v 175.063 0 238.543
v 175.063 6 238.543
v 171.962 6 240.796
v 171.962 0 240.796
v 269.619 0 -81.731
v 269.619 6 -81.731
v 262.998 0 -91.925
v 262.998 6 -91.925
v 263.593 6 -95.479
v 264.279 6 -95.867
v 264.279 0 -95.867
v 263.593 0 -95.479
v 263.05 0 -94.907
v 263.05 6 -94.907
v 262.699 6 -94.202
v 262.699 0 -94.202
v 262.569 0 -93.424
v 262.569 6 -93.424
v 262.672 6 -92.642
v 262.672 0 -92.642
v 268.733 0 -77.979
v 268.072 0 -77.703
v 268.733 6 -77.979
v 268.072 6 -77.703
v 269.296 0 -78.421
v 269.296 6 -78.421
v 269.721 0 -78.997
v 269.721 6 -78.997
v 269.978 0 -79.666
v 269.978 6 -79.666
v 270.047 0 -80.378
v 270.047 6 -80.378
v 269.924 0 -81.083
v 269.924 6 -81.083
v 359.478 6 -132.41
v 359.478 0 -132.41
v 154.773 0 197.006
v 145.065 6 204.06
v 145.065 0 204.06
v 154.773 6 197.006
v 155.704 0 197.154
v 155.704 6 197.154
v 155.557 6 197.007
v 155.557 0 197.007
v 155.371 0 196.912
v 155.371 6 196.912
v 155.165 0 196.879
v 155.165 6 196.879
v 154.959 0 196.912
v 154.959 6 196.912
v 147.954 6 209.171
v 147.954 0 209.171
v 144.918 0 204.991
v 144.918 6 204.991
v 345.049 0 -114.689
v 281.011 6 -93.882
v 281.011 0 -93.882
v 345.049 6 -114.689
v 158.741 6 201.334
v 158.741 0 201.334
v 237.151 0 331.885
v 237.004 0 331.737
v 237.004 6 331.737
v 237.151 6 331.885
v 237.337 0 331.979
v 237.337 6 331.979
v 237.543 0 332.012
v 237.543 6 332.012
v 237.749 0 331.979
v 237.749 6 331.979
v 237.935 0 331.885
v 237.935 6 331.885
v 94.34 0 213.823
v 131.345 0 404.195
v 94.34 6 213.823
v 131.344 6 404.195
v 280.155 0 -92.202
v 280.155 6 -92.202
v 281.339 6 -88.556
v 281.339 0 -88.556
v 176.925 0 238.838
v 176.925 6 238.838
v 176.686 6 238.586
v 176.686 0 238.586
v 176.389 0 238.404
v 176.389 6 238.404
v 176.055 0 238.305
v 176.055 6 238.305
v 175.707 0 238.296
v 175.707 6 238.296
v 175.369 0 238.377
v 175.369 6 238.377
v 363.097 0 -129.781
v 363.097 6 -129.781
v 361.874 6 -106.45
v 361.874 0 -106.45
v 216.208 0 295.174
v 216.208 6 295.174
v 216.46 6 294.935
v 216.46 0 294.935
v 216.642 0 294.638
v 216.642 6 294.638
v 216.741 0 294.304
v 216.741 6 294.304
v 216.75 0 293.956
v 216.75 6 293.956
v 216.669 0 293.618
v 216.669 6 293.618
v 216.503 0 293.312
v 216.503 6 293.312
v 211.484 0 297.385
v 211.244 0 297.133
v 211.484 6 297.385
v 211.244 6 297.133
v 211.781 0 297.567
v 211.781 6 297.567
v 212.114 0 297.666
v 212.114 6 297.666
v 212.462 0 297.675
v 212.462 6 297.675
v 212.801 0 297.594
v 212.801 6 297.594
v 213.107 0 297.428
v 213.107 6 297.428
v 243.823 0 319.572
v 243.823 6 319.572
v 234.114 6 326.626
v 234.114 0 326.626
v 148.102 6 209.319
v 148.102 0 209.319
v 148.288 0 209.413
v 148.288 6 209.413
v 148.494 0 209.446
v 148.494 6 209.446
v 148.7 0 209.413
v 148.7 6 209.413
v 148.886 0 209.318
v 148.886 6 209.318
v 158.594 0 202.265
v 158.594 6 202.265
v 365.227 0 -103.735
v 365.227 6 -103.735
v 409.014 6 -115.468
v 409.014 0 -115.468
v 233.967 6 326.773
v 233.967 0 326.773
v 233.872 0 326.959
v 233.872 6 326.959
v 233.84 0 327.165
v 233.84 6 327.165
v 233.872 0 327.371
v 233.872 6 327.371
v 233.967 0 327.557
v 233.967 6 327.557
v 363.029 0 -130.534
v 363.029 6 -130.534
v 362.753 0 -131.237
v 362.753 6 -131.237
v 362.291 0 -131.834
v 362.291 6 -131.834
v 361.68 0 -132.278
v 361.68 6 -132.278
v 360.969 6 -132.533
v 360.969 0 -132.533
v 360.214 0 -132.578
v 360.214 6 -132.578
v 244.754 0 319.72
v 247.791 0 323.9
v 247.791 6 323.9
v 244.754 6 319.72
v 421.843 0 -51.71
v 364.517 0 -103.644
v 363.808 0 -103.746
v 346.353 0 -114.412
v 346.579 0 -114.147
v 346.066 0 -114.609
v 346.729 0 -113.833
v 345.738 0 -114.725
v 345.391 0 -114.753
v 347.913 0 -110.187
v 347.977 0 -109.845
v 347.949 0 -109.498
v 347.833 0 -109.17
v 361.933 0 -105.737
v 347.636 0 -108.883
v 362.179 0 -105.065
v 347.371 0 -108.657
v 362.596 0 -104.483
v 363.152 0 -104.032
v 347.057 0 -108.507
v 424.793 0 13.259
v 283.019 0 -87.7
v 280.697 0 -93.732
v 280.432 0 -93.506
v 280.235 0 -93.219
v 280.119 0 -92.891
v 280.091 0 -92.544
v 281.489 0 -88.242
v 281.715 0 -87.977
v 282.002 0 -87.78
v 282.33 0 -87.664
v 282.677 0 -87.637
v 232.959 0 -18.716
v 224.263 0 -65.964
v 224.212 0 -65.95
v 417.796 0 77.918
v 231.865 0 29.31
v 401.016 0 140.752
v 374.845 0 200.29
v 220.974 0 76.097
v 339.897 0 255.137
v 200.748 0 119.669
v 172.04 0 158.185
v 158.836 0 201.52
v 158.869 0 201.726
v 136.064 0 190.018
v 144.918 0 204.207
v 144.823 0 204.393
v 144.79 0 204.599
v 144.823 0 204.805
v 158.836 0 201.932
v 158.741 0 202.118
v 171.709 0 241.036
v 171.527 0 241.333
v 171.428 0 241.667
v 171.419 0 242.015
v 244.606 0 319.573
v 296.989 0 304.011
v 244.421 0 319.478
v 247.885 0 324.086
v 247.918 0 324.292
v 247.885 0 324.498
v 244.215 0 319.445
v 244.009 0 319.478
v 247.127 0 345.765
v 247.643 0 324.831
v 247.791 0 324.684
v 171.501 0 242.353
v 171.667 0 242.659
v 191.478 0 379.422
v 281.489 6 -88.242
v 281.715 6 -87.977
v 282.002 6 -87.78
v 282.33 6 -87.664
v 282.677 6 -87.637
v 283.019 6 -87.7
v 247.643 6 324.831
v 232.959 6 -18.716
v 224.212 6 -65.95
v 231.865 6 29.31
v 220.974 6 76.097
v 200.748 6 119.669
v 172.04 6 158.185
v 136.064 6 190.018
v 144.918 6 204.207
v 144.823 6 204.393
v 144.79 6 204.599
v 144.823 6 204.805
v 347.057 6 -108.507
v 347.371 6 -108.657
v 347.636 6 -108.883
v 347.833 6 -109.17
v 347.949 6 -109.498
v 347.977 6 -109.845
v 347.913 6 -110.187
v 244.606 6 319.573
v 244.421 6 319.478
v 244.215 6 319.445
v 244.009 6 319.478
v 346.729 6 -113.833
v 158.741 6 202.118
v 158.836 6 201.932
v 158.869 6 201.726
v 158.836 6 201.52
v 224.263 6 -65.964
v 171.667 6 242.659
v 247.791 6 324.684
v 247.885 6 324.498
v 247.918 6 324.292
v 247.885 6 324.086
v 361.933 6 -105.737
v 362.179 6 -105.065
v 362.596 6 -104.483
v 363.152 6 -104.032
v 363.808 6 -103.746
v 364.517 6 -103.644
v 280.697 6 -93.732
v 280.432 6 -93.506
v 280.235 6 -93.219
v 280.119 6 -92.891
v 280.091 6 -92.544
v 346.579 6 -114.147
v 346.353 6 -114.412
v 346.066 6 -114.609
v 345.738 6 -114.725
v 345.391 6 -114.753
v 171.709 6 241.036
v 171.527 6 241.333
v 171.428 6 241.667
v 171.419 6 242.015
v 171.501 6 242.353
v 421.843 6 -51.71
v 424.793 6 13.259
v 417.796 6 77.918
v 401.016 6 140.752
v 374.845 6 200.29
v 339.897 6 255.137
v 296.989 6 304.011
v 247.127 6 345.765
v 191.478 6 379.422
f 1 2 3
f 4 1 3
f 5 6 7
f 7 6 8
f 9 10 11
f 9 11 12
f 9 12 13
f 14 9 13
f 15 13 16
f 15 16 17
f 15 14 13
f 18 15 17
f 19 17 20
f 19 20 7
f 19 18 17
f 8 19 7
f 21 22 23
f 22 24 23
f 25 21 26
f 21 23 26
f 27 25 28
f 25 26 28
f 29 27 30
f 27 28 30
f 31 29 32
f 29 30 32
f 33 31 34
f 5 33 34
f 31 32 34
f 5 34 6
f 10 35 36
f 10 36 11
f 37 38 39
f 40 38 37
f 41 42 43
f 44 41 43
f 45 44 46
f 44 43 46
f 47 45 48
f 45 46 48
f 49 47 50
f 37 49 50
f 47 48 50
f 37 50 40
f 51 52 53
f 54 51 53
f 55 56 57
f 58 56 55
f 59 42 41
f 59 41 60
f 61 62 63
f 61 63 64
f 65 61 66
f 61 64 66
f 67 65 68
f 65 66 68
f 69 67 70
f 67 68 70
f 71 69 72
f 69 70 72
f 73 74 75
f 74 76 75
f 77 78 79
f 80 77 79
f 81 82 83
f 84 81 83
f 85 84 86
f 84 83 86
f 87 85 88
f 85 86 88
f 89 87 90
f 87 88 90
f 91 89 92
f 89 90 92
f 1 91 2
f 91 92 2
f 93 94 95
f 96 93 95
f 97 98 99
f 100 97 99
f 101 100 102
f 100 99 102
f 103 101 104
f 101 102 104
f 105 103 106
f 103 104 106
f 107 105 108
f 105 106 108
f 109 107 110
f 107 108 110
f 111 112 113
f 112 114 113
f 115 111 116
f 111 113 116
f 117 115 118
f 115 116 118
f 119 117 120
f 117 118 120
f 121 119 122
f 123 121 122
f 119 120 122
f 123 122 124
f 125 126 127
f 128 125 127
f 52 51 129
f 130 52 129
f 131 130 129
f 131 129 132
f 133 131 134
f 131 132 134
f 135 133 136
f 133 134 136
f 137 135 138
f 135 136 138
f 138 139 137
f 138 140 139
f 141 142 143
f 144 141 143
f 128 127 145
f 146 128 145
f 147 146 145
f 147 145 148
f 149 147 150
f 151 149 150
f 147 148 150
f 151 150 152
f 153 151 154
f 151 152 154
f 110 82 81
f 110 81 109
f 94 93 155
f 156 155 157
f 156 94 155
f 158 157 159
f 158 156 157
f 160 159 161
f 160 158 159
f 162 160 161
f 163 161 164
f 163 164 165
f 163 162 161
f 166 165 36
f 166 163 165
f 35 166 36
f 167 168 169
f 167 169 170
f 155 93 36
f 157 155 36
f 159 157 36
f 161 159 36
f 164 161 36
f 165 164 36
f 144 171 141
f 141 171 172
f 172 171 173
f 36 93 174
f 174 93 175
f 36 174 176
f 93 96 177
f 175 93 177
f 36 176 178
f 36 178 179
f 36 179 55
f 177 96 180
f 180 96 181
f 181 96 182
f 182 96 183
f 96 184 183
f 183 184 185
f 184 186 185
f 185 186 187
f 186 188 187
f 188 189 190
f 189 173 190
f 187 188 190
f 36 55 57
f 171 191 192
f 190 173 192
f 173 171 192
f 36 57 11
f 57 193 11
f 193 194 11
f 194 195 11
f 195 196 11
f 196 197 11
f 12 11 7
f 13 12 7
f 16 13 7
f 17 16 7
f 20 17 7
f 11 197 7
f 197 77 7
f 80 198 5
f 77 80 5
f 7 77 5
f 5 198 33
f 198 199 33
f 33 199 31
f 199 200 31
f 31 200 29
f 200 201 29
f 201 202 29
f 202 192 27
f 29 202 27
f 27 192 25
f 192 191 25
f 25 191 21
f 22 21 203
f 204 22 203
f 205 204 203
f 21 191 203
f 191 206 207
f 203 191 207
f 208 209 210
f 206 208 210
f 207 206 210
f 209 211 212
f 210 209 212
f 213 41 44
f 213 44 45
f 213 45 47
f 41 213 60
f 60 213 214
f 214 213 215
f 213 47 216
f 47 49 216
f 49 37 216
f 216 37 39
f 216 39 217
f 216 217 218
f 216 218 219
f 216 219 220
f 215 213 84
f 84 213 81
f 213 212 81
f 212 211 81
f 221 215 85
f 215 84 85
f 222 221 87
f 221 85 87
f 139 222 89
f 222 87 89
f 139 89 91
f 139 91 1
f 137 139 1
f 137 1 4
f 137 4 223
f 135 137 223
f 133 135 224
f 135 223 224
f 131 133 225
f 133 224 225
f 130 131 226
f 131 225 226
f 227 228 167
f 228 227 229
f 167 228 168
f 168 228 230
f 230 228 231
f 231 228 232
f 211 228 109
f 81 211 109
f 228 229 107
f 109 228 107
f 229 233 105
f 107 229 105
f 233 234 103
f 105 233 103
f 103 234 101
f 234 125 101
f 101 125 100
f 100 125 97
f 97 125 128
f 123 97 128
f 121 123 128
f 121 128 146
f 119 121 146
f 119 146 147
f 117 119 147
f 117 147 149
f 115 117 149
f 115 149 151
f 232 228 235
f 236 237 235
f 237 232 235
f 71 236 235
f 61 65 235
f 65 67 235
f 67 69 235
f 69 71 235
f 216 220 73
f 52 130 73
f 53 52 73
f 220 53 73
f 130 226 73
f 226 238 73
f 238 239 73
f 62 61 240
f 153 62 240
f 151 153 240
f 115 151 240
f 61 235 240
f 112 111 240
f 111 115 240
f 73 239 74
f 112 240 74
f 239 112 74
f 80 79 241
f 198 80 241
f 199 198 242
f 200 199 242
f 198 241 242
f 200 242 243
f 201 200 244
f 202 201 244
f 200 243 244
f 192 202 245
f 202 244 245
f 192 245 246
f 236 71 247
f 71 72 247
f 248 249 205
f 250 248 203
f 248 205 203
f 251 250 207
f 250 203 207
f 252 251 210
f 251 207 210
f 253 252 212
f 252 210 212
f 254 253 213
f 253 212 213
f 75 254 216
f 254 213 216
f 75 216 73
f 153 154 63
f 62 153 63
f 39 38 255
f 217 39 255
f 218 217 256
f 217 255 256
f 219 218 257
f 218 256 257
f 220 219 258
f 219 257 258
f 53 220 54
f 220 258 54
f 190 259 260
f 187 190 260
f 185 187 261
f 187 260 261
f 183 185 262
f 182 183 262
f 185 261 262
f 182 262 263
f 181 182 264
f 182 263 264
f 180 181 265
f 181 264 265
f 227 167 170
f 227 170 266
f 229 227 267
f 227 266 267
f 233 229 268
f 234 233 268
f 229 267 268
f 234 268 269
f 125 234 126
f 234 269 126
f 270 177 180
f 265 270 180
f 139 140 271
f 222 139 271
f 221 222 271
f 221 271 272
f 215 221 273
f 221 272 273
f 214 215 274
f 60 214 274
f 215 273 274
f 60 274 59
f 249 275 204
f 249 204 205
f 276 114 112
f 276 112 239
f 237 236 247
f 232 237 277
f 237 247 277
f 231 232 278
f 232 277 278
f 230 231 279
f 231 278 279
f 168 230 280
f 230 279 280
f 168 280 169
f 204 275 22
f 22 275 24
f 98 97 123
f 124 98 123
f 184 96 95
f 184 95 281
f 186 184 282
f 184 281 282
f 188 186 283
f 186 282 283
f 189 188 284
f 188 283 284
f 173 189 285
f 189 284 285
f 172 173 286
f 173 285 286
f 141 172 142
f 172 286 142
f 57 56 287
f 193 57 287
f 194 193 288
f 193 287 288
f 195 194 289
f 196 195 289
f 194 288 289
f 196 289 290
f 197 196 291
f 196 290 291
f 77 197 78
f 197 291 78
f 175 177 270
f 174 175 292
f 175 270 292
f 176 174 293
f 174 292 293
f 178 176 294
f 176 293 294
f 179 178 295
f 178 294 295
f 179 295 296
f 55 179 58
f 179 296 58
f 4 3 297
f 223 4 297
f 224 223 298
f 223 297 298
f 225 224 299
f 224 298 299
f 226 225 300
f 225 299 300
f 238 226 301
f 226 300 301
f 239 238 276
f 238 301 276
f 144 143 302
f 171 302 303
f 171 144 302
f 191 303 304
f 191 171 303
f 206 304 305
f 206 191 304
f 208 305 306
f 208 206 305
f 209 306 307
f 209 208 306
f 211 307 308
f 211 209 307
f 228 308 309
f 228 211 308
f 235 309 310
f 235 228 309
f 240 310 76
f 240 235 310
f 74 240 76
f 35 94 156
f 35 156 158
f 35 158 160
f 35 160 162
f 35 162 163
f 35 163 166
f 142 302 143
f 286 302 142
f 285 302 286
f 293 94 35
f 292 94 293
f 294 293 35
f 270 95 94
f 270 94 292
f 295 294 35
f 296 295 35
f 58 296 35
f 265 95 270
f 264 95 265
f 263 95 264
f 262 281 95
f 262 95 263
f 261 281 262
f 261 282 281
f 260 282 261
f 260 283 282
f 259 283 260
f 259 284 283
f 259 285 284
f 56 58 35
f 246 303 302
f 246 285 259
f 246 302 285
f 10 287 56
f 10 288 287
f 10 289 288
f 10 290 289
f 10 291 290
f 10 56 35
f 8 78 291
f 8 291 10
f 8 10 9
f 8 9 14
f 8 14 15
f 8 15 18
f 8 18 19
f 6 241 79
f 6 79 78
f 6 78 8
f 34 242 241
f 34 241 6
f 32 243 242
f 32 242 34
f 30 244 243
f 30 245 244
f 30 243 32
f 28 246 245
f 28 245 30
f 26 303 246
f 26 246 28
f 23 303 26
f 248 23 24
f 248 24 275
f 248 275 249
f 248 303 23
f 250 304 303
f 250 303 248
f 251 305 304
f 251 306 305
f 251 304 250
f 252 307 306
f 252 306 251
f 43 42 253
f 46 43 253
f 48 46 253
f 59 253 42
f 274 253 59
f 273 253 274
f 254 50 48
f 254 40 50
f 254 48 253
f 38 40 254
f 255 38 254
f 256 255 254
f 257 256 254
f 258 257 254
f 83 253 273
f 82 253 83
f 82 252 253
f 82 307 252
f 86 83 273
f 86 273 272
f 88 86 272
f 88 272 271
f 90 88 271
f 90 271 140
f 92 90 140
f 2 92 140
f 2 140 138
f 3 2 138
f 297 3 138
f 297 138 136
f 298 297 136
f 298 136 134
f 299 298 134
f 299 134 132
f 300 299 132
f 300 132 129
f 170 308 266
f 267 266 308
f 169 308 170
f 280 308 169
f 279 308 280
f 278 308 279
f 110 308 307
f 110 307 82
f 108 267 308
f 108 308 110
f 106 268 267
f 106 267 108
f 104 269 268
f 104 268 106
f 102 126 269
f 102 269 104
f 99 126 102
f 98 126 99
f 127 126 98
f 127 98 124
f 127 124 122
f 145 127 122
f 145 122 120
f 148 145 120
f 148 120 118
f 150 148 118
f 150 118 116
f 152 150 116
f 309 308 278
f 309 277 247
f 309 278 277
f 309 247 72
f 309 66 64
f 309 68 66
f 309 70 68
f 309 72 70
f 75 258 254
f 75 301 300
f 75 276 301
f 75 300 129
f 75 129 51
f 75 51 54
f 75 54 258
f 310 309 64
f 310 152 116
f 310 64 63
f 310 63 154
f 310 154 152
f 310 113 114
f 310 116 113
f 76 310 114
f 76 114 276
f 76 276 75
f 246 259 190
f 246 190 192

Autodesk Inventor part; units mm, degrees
ref_plane "YZ Plane" through (0, 0, 0) normal (1, 0, 0) x (0, 1, 0)
ref_plane "XZ Plane" through (0, 0, 0) normal (0, 1, 0) x (-1, 0, 0)
ref_plane "XY Plane" through (0, 0, 0) normal (0, 0, 1) x (1, 0, 0)
sketch "Sketch1" plane through (0, 0, 0) normal (0, 1, 0) x (-1, 0, 0)
  circle A0 centre (0, 0) radius 425
  circle A1 centre (0, 0) radius 233.71
  dimension "d84" = 467.42
  dimension "d85" = 850
extrude "Extrusion3" add sketch "Sketch1" along normal blind 6
sketch "Sketch2" plane through (0, 6, 0) normal (0, 1, 0) x (1, 0, 0)
  circle A0 centre (0, 0) radius 329.355 construction
  line L0 (3.25, 363.0217) -> (3.25, 295.6883)
  line L1 (-3.25, 295.6883) -> (-3.25, 363.0217)
  arc A1 (-3.25, 295.6883) -> (-1.9167, 294.355) centre (-1.9167, 295.6883) ccw
  arc A2 (1.9167, 294.355) -> (3.25, 295.6883) centre (1.9167, 295.6883) ccw
  arc A3 (-1.9167, 364.355) -> (-3.25, 363.0217) centre (-1.9167, 363.0217) ccw
  arc A4 (3.25, 363.0217) -> (1.9167, 364.355) centre (1.9167, 363.0217) ccw
  line L2 (-1.9167, 364.355) -> (1.9167, 364.355)
  line L3 (-1.9167, 294.355) -> (1.9167, 294.355)
  line L4 (0, 294.355) -> (0, 329.355) construction
  line L5 (0, 364.355) -> (0, 329.355) construction
  line L6 (0, 364.355) -> (0, 294.355) construction
  line L7 (175.0629, -238.5433) -> (171.9617, -240.7965)
  arc A5 (176.9253, -238.8383) -> (175.0629, -238.5433) centre (175.8467, -239.622) ccw
  arc A6 (171.9617, -240.7965) -> (171.6667, -242.6589) centre (172.7454, -241.8752) ccw
  line L8 (173.0175, -238.1382) -> (193.59, -266.4538) construction
  line L9 (211.2443, -297.1327) -> (171.6667, -242.6589)
  line L10 (176.9253, -238.8383) -> (216.5029, -293.3121)
  line L11 (214.1625, -294.7694) -> (173.0175, -238.1382) construction
  line L12 (214.1625, -294.7694) -> (193.59, -266.4538) construction
  arc A7 (211.2443, -297.1327) -> (213.1067, -297.4277) centre (212.323, -296.349) ccw
  line L13 (216.2079, -295.1745) -> (213.1067, -297.4277)
  arc A8 (216.2079, -295.1745) -> (216.5029, -293.3121) centre (215.4242, -294.0958) ccw
  line L14 (280.1548, 92.2019) -> (281.3393, 88.5562)
  arc A9 (281.0108, 93.882) -> (280.1548, 92.2019) centre (281.4229, 92.614) ccw
  arc A10 (281.3393, 88.5562) -> (283.0194, 87.7002) centre (282.6074, 88.9682) ccw
  line L15 (279.9482, 90.9607) -> (313.2352, 101.7763) construction
  line L16 (347.0573, 108.5073) -> (283.0194, 87.7002)
  line L17 (281.0108, 93.882) -> (345.0486, 114.6892)
  line L18 (346.5222, 112.5919) -> (279.9482, 90.9607) construction
  line L19 (346.5222, 112.5919) -> (313.2352, 101.7763) construction
  arc A11 (347.0573, 108.5073) -> (347.9133, 110.1874) centre (346.6452, 109.7754) ccw
  line L20 (346.7287, 113.8331) -> (347.9133, 110.1874)
  arc A12 (346.7287, 113.8331) -> (345.0486, 114.6892) centre (345.4607, 113.4211) ccw
  dimension "d86" = 658.71
  dimension "d21" = 6.5
  dimension "d24" = 2.6667
  dimension "d25" = 2.6667
  dimension "d32" = 1.3333
  dimension "d33" = 1.3333
  dimension "d162" = 70
  dimension "d163" = 294.355
  dimension "d165" = 3.25
extrude "Extrusion4" cut sketch "Sketch2" against normal through all
sketch "Sketch3" plane through (0, 6, 0) normal (0, 1, 0) x (1, 0, 0)
  arc A0 (-131.3389, -404.1968) -> (131.3445, -404.195) centre (0, 0) ccw
  arc A1 (-77.7244, -128.3741) -> (77.7297, -128.3709) centre (0, 0) ccw
  line L0 (-122.1811, -173.696) -> (-161.3589, -227.6196)
  line L1 (-131.3389, -404.1968) -> (-77.7244, -128.3741)
  line L2 (0, 0) -> (0, -341.2918)
  line L3 (131.3445, -404.195) -> (77.7297, -128.3709)
  line L4 (210.5535, -295.3313) -> (171.3679, -241.3969) projected
  dimension "d52" = 25
  dimension "d87" = 150.07
  dimension "d88" = 425
  dimension "d89" = 25
  dimension "d90" = 11
  dimension "d91" = 11
sketch "Sketch5" plane through (0, 6, 0) normal (0, 1, 0) x (1, 0, 0)
  line L0 (3.25, 363.0217) -> (3.25, 295.6883) projected
  line L1 (5.5862, 281.6788) -> (-6.155, 278.5328)
  line L2 (-11.2263, 385.43) -> (10.5847, 377.0575)
  line L3 (6.5657, 233.6709) -> (8.9394, 278.9635)
  line L4 (14.2034, 379.4075) -> (16.5771, 424.7001)
  arc A0 (10.5847, 377.0575) -> (14.2034, 379.4075) centre (11.5404, 379.5471) ccw
  arc A1 (8.9394, 278.9635) -> (5.5862, 281.6788) centre (6.2763, 279.103) ccw
  arc A2 (-11.2263, 385.43) -> (-14.8449, 382.8009) centre (-12.1819, 382.9405) ccw
  line L5 (-3.25, 295.6883) -> (-3.25, 363.0217) projected
  line L6 (-14.8449, 382.8009) -> (-9.5081, 280.969)
  arc A3 (-9.5081, 280.969) -> (-6.155, 278.5328) centre (-6.8451, 281.1086) ccw
  line L7 (-1.9167, 294.355) -> (1.9167, 294.355) projected
  line L8 (1.9167, 364.355) -> (-1.9167, 364.355) projected
  line L9 (16.5771, 424.7001) -> (16.5774, 424.7058)
  line L10 (6.5657, 233.6709) -> (6.5621, 233.6028)
  circle A4 centre (0, 0) radius 425
  circle A5 centre (0, 0) radius 233.71
  line L11 (-356.4489, 130.7516) -> (-398.7912, 147.0053)
  arc A6 (-355.3322, 126.5839) -> (-356.4489, 130.7516) centre (-357.4046, 128.2621) ccw
  line L12 (-370.0348, 108.4276) -> (-355.3322, 126.5839)
  arc A7 (-370.0348, 108.4276) -> (-368.6526, 104.1736) centre (-367.9624, 106.7494) ccw
  line L13 (-368.6526, 104.1736) -> (-270.1556, 77.7814)
  arc A8 (-270.1556, 77.7814) -> (-266.8024, 80.2177) centre (-269.4654, 80.3572) ccw
  line L14 (-266.1663, 92.3563) -> (-266.8024, 80.2177)
  arc A9 (-262.5476, 94.7063) -> (-266.1663, 92.3563) centre (-263.5032, 92.2167) ccw
  line L15 (-220.2053, 78.4526) -> (-262.5476, 94.7063)
  line L16 (-220.2053, 78.4526) -> (-220.1417, 78.4282)
  line L17 (-398.7912, 147.0053) -> (-398.7965, 147.0073)
  line L18 (-142.66, -185.1845) -> (-142.6172, -185.1316)
  line L19 (-263.0436, -333.8458) -> (-263.0472, -333.8502)
  line L20 (132.0366, -192.9029) -> (131.9995, -192.8458)
  line L21 (236.2213, -353.3334) -> (236.2244, -353.3381)
  line L22 (365.2271, 103.7351) -> (409.0364, 115.4738)
  arc A10 (361.8739, 106.4505) -> (365.2271, 103.7351) centre (364.5369, 106.3109) ccw
  line L23 (363.0966, 129.7812) -> (361.8739, 106.4505)
  arc A11 (363.0966, 129.7812) -> (359.478, 132.4103) centre (360.4336, 129.9208) ccw
  line L24 (359.478, 132.4103) -> (264.2793, 95.867)
  arc A12 (264.2793, 95.867) -> (262.9985, 91.9251) centre (265.2349, 93.3774) ccw
  line L25 (269.6187, 81.7308) -> (262.9985, 91.9251)
  arc A13 (268.0724, 77.7026) -> (269.6187, 81.7308) centre (267.3822, 80.2784) ccw
  line L26 (224.2631, 65.9639) -> (268.0724, 77.7026)
  line L27 (224.2631, 65.9639) -> (224.1973, 65.9463)
  line L28 (409.0364, 115.4738) -> (409.0419, 115.4753)
  line L29 (0, -233.71) -> (0, -425)
  arc A14 (131.3445, -404.195) -> (-131.3389, -404.1968) centre (0, 0) ccw projected
  point P0 (-425, 0)
  point P1 (-425, 0)
  point P2 (-398.7693, 146.9969)
  point P3 (-220.1557, 78.4336)
  point P4 (16.5759, 424.6766)
  point P5 (6.5629, 233.6178)
  point P6 (409.0137, 115.4677)
  point P7 (224.2118, 65.9502)
  dimension "d63" = 2.6667
  dimension "d64" = 3
  dimension "d66" = 3
  dimension "d67" = 2.6667
  dimension "d68" = 2.6667
  dimension "d70" = 72
  dimension "d71" = 72
sketch "Sketch6" plane through (0, 6, 0) normal (0, 1, 0) x (1, 0, 0)
  line L0 (237.9351, -331.8846) -> (247.6433, -324.8312)
  line L1 (243.8227, -319.5725) -> (234.1145, -326.626)
  line L2 (210.5535, -295.3313) -> (171.3679, -241.3969) projected
  line L3 (215.5172, -293.3731) -> (212.416, -295.6263) projected
  arc A0 (244.7539, -319.72) -> (243.8227, -319.5725) centre (244.2145, -320.1119) ccw
  arc A1 (247.6433, -324.8312) -> (247.7908, -323.9) centre (247.2514, -324.2918) ccw
  arc A2 (237.0039, -331.7371) -> (237.9351, -331.8846) centre (237.5432, -331.3452) ccw
  arc A3 (234.1145, -326.626) -> (233.967, -327.5572) centre (234.5063, -327.1653) ccw
  line L4 (233.967, -327.5572) -> (237.0039, -331.7371)
  line L5 (247.7908, -323.9) -> (244.7539, -319.72)
  line L6 (171.3679, -241.3969) -> (210.5535, -295.3313) projected
  line L7 (190.9607, -268.3641) -> (196.2193, -264.5435)
  line L8 (215.8122, -291.5107) -> (176.6265, -237.5763) projected
  line L9 (145.065, -204.0599) -> (154.7732, -197.0065)
  line L10 (158.5938, -202.2651) -> (148.8856, -209.3185)
  arc A4 (158.5938, -202.2651) -> (158.7413, -201.3339) centre (158.202, -201.7257) ccw
  arc A5 (155.7044, -197.154) -> (154.7732, -197.0065) centre (155.1651, -197.5458) ccw
  arc A6 (145.065, -204.0599) -> (144.9175, -204.9911) centre (145.4569, -204.5992) ccw
  arc A7 (147.9544, -209.171) -> (148.8856, -209.3185) centre (148.4938, -208.7792) ccw
  line L11 (147.9544, -209.171) -> (144.9175, -204.9911)
  line L12 (155.7044, -197.154) -> (158.7413, -201.3339)
  point P0 (0, 0)
  dimension "d104" = 6.5
  dimension "d105" = 12
  dimension "d108" = 1.3333
  dimension "d109" = 1.3333
  dimension "d110" = 1.3333
  dimension "d111" = 1.3333
  dimension "d112" = 0
  dimension "d149" = 145
  dimension "d150" = 90
  dimension "d151" = 90
  dimension "d152" = 90
  dimension "d153" = 90
extrude "Extrusion7" cut sketch "Sketch6" against normal through all
pattern_circular "Circular Pattern2" count 2 over 72 about axis through (0, -10, 0) along (0, 1, 0) of "Extrusion7"
pattern_circular "Circular Pattern3" count 2 over 144 about axis through (0, -10, 0) along (0, 1, 0) of "Extrusion7"
mirror "Mirror3" about plane through (0, 0, 0) normal (1, 0, 0) of "Extrusion7"
extrude "Extrusion10" cut sketch "Sketch3" against normal blind 10
mirror "Mirror4" about plane through (0, 0, 0) normal (1, 0, 0) of "Extrusion4"
pattern_circular "Circular Pattern4" count 2 over 144 about axis through (0, -10, 0) along (0, -1, 0) of "Extrusion7"
extrude "Extrusion11" cut sketch "Sketch5" against normal through all contours A1 L3 L10 A5 L16 L15 A9 L14 A8 L13 A7 L12 A6 L11 A4 L4 A0 L2 A2 L6 A3 L1 | L1 A3 L6 A2 L2 A0 L4 A4 L22 A10 L23 A11 L24 A12 L25 A13 L26 L27 A5 L10 L3 A1 | A5 L29 A4 L11 A6 L12 A7 L13 A8 L14 A9 L15 L16
equation "\"BendRadius\" = Thickness"
equation "\"BendReliefWidth\" = Thickness"
equation "\"BendReliefDepth\" = 0.5 * Thickness"
equation "\"CornerReliefSize\" = 4 * Thickness"
equation "\"MinimumRemnant\" = 2 * Thickness"
equation "\"TransitionRadius\" = BendRadius"
equation "\"JacobiRadiusSize\" = BendRadius"
equation "\"GapSize\" = Thickness"
equation "\"Thickness\" = 0.5"
properties part number "Ring C4" material "Wood (Maple)"
